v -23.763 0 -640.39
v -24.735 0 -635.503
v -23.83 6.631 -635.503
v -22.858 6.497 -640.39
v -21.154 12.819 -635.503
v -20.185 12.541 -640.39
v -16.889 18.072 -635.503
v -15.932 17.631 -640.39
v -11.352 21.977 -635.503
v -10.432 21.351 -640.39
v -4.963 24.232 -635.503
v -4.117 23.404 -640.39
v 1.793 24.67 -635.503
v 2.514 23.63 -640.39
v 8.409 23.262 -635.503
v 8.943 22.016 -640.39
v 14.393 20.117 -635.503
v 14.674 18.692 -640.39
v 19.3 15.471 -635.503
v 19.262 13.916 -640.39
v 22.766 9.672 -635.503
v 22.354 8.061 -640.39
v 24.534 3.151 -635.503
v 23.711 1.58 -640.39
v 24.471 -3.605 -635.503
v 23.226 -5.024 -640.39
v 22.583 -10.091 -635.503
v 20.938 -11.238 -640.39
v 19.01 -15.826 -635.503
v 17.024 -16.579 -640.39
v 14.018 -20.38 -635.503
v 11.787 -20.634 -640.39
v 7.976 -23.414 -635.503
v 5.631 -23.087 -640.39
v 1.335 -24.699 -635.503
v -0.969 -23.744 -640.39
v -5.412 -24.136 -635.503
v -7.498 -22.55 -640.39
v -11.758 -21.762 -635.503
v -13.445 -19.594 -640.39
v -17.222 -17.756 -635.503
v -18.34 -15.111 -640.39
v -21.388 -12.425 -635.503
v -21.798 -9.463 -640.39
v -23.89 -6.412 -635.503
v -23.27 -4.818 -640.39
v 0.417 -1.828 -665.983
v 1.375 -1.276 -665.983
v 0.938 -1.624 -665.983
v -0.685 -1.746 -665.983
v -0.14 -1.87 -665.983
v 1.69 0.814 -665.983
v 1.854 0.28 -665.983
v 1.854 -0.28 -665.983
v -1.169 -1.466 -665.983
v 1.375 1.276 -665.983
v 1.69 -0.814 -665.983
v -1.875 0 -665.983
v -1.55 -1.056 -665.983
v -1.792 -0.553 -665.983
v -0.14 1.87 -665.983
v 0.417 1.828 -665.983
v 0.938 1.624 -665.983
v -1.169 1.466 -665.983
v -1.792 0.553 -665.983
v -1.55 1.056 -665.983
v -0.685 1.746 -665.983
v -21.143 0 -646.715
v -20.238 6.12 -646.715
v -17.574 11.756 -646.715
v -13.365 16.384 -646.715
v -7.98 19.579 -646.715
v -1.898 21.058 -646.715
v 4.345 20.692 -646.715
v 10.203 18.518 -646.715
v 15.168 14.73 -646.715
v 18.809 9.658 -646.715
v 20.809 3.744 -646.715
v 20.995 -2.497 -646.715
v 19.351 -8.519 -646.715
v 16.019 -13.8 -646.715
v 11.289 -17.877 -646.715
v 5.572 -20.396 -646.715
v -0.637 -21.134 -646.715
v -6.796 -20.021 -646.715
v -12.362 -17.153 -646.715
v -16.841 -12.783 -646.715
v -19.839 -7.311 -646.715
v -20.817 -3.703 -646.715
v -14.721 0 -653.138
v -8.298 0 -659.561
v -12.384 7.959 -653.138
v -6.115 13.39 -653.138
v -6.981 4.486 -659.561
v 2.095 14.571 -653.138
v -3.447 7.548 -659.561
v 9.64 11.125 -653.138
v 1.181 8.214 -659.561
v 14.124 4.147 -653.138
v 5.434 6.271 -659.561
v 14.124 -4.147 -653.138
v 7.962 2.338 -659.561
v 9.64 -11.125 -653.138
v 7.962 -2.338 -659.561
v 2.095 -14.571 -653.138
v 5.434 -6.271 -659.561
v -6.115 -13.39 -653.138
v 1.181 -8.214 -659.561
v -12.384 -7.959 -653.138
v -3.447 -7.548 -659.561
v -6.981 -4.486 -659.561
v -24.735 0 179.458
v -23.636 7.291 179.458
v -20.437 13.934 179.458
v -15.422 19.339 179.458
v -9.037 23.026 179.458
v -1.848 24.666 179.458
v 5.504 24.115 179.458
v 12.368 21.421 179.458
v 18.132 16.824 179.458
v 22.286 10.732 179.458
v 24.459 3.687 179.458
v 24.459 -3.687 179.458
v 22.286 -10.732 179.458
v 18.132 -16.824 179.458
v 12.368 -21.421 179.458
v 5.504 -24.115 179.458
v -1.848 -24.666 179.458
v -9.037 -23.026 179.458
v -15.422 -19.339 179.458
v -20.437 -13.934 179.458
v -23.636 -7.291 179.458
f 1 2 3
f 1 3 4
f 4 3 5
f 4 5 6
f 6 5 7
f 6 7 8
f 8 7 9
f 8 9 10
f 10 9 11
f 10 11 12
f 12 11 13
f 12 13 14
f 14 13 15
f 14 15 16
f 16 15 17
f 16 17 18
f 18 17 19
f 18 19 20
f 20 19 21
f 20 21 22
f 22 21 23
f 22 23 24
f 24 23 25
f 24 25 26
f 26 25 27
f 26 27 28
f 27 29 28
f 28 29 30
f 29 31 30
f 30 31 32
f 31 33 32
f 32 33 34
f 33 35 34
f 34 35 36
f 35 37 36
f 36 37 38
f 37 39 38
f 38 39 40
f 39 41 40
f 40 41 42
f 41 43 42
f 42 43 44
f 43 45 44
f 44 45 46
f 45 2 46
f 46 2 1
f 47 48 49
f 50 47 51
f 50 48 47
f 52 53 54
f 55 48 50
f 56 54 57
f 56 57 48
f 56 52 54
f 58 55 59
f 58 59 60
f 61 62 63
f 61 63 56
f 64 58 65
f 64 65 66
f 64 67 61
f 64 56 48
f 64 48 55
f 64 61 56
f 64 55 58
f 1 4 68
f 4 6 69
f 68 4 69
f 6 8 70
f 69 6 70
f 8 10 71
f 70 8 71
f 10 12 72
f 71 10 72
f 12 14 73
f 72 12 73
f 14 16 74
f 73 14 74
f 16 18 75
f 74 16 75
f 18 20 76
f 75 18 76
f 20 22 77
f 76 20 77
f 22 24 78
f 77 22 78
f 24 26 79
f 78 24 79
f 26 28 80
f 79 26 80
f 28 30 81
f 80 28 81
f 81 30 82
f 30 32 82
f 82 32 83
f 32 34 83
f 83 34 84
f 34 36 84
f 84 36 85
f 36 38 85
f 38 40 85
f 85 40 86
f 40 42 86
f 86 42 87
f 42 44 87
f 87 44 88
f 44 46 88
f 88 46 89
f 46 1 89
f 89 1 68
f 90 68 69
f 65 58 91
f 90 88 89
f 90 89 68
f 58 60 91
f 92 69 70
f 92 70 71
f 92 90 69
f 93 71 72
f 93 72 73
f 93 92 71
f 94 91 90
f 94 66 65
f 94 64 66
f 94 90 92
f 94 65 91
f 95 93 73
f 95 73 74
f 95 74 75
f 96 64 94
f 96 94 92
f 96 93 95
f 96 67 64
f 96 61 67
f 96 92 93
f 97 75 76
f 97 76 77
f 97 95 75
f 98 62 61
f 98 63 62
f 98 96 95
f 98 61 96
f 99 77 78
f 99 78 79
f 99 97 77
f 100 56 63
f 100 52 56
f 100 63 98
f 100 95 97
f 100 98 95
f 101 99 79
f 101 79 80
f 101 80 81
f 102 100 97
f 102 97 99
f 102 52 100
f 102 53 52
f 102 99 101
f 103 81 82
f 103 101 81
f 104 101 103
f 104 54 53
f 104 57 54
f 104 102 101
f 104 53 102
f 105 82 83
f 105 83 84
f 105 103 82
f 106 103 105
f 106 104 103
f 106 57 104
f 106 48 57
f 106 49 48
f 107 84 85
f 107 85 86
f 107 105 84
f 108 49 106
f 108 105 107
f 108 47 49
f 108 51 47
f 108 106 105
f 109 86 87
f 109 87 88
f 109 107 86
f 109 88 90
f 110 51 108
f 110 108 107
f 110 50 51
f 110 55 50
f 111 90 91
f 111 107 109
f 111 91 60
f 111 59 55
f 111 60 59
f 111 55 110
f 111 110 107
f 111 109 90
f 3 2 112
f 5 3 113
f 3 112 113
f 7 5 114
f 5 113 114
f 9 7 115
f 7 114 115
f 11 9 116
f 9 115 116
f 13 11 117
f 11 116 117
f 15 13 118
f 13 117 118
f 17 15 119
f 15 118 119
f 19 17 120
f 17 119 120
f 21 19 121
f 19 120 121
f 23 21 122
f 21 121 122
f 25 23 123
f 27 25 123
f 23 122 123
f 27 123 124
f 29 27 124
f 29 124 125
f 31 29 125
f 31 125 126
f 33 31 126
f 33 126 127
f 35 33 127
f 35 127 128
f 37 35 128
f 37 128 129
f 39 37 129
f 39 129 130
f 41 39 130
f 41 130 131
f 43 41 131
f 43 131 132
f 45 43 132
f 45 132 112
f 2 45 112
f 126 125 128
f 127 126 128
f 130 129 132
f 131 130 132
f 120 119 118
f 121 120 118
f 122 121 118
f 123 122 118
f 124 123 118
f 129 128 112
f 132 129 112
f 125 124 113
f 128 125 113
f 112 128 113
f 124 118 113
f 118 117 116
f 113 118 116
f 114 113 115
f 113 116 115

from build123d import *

# Parameters (mm, degrees)
F0_W     = 24.73539114
F0_H     = 419.7955727577
F2_DEPTH = 425.6457388401
F3_SIZE  = 22.86
F4_SIZE  = 5.08
F5_SIZE  = 2.54


with BuildPart() as f1:
    # F0 (on Front) → F1 (revolve)
    with BuildSketch(Plane.XZ):
        with Locations((-12.36769557, -30.4397642612)):
            Rectangle(F0_W, F0_H)
    revolve(axis=Axis((0, 0, -30.4397642612), (0, 0, -1)))

    # F2 (add): a face of the model
    f2_faces = [f1.faces().sort_by_distance(p)[0] for p in [
        (0, 0, -240.3375506401),
    ]]
    extrude(f2_faces, amount=F2_DEPTH)

    # F3
    f3_edges = [f1.edges().sort_by_distance(p)[0] for p in [
        (24.735391, 0, -665.983289),
    ]]
    chamfer(f3_edges, length=F3_SIZE)

    # F4
    f4_edges = [f1.edges().sort_by_distance(p)[0] for p in [
        (24.735391, 0, -643.123289),
    ]]
    chamfer(f4_edges, length=F4_SIZE)

    # F5
    f5_edges = [f1.edges().sort_by_distance(p)[0] for p in [
        (24.735385, 0, -638.043289),
    ]]
    chamfer(f5_edges, length=F5_SIZE)


solid = f1.part
